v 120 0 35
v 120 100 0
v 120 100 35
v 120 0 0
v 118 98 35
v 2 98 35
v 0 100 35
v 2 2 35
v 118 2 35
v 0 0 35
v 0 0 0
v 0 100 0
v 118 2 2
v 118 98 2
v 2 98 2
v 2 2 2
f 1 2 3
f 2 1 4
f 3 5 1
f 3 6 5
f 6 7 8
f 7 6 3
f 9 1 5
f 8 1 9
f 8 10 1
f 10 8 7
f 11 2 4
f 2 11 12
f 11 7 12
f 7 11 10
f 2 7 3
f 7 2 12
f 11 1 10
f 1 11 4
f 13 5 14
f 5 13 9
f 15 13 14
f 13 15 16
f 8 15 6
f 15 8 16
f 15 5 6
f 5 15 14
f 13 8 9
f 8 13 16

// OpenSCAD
// NeuroFocus Enclosure CAD Source
// Dimensions: 120 x 100 x 35 mm

difference() {
    // Main Body
    cube([120, 100, 35]);
    
    // Hollow inside
    translate([2, 2, 2])
    cube([116, 96, 33]);
}
